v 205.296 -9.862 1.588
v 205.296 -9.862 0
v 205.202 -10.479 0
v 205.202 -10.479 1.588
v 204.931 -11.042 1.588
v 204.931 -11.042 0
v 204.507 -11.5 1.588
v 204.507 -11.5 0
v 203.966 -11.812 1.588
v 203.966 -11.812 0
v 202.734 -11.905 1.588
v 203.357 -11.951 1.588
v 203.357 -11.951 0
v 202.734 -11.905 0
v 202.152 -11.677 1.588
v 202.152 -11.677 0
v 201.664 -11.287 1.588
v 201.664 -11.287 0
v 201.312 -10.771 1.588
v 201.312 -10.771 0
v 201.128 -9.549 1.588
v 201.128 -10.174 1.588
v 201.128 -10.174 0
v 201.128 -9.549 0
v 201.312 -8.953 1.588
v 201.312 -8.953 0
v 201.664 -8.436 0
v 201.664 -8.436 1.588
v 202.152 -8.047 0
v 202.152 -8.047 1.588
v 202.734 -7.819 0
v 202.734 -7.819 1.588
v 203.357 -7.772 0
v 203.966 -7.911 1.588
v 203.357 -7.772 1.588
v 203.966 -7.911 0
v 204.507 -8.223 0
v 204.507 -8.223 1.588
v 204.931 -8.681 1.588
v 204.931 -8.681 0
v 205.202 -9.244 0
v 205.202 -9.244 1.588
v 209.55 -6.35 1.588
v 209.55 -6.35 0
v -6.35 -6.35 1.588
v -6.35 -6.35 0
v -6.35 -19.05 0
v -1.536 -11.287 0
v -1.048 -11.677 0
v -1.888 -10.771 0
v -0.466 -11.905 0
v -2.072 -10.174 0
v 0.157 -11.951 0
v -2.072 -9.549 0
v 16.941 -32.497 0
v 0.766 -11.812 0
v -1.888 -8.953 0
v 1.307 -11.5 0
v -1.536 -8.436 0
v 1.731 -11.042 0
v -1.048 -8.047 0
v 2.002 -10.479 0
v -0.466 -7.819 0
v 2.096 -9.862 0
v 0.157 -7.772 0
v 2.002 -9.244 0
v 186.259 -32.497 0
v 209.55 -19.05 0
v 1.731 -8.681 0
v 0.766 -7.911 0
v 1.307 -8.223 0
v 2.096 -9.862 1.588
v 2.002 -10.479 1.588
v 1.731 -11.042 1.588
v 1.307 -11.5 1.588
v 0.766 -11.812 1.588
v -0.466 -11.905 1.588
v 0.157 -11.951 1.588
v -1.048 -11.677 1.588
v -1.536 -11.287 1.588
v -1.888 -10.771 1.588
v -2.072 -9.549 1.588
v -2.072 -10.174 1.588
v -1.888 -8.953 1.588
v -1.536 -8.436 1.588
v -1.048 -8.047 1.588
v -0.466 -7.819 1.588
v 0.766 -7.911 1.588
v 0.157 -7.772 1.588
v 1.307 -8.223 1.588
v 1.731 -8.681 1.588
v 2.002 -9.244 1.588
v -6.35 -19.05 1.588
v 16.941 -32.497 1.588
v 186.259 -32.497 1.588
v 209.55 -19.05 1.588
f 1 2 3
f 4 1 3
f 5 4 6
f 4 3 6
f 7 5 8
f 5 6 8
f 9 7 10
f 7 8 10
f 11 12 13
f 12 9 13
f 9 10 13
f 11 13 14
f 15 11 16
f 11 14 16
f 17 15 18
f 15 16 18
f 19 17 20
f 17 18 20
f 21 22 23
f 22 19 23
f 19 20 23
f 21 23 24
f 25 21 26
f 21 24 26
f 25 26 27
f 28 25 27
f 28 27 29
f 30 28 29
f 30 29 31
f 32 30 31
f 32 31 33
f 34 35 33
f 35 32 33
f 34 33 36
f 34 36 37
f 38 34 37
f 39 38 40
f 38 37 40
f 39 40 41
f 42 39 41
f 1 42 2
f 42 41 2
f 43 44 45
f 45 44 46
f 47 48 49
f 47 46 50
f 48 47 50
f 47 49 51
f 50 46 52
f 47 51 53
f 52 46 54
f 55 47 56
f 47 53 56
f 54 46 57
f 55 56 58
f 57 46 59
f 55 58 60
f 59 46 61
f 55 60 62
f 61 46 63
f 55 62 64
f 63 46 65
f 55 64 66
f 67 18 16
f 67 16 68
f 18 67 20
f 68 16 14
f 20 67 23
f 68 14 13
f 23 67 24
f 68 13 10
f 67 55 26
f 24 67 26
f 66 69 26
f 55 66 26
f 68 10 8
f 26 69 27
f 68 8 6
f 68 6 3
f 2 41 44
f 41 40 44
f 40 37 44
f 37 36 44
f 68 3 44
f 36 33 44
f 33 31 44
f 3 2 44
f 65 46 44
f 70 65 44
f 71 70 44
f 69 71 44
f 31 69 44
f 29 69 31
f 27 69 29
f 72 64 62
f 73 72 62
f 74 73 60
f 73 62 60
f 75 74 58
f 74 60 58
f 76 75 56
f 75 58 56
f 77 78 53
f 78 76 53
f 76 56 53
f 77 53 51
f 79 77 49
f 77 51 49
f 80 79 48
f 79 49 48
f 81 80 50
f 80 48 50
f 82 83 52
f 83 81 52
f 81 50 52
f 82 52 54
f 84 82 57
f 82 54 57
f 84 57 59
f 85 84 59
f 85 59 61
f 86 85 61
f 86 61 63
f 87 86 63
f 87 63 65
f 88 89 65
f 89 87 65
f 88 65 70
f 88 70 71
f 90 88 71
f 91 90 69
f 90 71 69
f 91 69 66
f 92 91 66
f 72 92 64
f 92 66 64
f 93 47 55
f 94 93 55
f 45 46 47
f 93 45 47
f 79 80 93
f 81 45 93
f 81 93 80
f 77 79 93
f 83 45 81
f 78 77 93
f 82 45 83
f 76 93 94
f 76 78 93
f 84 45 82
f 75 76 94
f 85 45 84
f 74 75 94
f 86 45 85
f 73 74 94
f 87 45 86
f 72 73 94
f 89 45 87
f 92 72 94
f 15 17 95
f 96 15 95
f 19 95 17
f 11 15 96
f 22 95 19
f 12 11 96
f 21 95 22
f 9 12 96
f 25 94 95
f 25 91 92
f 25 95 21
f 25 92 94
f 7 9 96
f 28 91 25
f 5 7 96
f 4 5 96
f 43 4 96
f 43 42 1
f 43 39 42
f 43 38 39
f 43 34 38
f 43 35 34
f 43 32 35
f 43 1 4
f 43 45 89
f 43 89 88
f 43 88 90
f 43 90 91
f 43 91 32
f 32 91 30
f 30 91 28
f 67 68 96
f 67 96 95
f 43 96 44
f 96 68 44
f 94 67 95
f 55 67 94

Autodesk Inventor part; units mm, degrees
ref_plane "YZ Plane" through (0, 0, 0) normal (1, 0, 0) x (0, 1, 0)
ref_plane "XZ Plane" through (0, 0, 0) normal (0, 1, 0) x (-1, 0, 0)
ref_plane "XY Plane" through (0, 0, 0) normal (0, 0, 1) x (1, 0, 0)
sketch "Block1" plane through (0, 0, 0) normal (0, 0, 1) x (1, 0, 0)
  line L0 (-105.9874, 13.2259) -> (-105.9874, 0.5259)
  line L1 (109.9126, 13.2259) -> (-105.9874, 13.2259)
  line L2 (109.9126, 0.5259) -> (109.9126, 13.2259)
  line L3 (86.6216, -12.9211) -> (-82.6964, -12.9211)
  line L4 (-105.9874, 0.5259) -> (-82.6964, -12.9211)
  line L5 (109.9126, 0.5259) -> (86.6216, -12.9211)
  circle A0 centre (-99.6374, 9.7141) radius 2.0955
  circle A1 centre (103.5626, 9.7141) radius 2.0955
  point P0 (3.9065, 11.282)
  dimension "d30" = 4.191
  dimension "d31" = 4.191
sketch "Sketch1" plane through (0, 0, 0) normal (0, 0, 1) x (1, 0, 0)
  line L0 (-6.35, -6.35) -> (-6.35, -19.05)
  line L1 (209.55, -6.35) -> (-6.35, -6.35)
  line L2 (209.55, -19.05) -> (209.55, -6.35)
  line L3 (186.259, -32.4971) -> (16.941, -32.4971)
  line L4 (-6.35, -19.05) -> (16.941, -32.4971)
  line L5 (209.55, -19.05) -> (186.259, -32.4971)
  circle A0 centre (0, -9.8618) radius 2.0955
  circle A1 centre (203.2, -9.8618) radius 2.0955
  point P0 (0, 0)
extrude "Extrusion1" add sketch "Sketch1" along normal blind 1.5875
feature "Bend Part1" [suppressed]
equation "\"BendRadius\" = Thickness"
equation "\"BendReliefWidth\" = Thickness"
equation "\"BendReliefDepth\" = 0.5 * Thickness"
equation "\"CornerReliefSize\" = 4 * Thickness"
equation "\"MinimumRemnant\" = 2 * Thickness"
equation "\"TransitionRadius\" = BendRadius"
equation "\"JacobiRadiusSize\" = BendRadius"
equation "\"GapSize\" = Thickness"
equation "\"Thickness\" = 1.5875"
properties part number "wedge" material "Acetal Resin, White"
